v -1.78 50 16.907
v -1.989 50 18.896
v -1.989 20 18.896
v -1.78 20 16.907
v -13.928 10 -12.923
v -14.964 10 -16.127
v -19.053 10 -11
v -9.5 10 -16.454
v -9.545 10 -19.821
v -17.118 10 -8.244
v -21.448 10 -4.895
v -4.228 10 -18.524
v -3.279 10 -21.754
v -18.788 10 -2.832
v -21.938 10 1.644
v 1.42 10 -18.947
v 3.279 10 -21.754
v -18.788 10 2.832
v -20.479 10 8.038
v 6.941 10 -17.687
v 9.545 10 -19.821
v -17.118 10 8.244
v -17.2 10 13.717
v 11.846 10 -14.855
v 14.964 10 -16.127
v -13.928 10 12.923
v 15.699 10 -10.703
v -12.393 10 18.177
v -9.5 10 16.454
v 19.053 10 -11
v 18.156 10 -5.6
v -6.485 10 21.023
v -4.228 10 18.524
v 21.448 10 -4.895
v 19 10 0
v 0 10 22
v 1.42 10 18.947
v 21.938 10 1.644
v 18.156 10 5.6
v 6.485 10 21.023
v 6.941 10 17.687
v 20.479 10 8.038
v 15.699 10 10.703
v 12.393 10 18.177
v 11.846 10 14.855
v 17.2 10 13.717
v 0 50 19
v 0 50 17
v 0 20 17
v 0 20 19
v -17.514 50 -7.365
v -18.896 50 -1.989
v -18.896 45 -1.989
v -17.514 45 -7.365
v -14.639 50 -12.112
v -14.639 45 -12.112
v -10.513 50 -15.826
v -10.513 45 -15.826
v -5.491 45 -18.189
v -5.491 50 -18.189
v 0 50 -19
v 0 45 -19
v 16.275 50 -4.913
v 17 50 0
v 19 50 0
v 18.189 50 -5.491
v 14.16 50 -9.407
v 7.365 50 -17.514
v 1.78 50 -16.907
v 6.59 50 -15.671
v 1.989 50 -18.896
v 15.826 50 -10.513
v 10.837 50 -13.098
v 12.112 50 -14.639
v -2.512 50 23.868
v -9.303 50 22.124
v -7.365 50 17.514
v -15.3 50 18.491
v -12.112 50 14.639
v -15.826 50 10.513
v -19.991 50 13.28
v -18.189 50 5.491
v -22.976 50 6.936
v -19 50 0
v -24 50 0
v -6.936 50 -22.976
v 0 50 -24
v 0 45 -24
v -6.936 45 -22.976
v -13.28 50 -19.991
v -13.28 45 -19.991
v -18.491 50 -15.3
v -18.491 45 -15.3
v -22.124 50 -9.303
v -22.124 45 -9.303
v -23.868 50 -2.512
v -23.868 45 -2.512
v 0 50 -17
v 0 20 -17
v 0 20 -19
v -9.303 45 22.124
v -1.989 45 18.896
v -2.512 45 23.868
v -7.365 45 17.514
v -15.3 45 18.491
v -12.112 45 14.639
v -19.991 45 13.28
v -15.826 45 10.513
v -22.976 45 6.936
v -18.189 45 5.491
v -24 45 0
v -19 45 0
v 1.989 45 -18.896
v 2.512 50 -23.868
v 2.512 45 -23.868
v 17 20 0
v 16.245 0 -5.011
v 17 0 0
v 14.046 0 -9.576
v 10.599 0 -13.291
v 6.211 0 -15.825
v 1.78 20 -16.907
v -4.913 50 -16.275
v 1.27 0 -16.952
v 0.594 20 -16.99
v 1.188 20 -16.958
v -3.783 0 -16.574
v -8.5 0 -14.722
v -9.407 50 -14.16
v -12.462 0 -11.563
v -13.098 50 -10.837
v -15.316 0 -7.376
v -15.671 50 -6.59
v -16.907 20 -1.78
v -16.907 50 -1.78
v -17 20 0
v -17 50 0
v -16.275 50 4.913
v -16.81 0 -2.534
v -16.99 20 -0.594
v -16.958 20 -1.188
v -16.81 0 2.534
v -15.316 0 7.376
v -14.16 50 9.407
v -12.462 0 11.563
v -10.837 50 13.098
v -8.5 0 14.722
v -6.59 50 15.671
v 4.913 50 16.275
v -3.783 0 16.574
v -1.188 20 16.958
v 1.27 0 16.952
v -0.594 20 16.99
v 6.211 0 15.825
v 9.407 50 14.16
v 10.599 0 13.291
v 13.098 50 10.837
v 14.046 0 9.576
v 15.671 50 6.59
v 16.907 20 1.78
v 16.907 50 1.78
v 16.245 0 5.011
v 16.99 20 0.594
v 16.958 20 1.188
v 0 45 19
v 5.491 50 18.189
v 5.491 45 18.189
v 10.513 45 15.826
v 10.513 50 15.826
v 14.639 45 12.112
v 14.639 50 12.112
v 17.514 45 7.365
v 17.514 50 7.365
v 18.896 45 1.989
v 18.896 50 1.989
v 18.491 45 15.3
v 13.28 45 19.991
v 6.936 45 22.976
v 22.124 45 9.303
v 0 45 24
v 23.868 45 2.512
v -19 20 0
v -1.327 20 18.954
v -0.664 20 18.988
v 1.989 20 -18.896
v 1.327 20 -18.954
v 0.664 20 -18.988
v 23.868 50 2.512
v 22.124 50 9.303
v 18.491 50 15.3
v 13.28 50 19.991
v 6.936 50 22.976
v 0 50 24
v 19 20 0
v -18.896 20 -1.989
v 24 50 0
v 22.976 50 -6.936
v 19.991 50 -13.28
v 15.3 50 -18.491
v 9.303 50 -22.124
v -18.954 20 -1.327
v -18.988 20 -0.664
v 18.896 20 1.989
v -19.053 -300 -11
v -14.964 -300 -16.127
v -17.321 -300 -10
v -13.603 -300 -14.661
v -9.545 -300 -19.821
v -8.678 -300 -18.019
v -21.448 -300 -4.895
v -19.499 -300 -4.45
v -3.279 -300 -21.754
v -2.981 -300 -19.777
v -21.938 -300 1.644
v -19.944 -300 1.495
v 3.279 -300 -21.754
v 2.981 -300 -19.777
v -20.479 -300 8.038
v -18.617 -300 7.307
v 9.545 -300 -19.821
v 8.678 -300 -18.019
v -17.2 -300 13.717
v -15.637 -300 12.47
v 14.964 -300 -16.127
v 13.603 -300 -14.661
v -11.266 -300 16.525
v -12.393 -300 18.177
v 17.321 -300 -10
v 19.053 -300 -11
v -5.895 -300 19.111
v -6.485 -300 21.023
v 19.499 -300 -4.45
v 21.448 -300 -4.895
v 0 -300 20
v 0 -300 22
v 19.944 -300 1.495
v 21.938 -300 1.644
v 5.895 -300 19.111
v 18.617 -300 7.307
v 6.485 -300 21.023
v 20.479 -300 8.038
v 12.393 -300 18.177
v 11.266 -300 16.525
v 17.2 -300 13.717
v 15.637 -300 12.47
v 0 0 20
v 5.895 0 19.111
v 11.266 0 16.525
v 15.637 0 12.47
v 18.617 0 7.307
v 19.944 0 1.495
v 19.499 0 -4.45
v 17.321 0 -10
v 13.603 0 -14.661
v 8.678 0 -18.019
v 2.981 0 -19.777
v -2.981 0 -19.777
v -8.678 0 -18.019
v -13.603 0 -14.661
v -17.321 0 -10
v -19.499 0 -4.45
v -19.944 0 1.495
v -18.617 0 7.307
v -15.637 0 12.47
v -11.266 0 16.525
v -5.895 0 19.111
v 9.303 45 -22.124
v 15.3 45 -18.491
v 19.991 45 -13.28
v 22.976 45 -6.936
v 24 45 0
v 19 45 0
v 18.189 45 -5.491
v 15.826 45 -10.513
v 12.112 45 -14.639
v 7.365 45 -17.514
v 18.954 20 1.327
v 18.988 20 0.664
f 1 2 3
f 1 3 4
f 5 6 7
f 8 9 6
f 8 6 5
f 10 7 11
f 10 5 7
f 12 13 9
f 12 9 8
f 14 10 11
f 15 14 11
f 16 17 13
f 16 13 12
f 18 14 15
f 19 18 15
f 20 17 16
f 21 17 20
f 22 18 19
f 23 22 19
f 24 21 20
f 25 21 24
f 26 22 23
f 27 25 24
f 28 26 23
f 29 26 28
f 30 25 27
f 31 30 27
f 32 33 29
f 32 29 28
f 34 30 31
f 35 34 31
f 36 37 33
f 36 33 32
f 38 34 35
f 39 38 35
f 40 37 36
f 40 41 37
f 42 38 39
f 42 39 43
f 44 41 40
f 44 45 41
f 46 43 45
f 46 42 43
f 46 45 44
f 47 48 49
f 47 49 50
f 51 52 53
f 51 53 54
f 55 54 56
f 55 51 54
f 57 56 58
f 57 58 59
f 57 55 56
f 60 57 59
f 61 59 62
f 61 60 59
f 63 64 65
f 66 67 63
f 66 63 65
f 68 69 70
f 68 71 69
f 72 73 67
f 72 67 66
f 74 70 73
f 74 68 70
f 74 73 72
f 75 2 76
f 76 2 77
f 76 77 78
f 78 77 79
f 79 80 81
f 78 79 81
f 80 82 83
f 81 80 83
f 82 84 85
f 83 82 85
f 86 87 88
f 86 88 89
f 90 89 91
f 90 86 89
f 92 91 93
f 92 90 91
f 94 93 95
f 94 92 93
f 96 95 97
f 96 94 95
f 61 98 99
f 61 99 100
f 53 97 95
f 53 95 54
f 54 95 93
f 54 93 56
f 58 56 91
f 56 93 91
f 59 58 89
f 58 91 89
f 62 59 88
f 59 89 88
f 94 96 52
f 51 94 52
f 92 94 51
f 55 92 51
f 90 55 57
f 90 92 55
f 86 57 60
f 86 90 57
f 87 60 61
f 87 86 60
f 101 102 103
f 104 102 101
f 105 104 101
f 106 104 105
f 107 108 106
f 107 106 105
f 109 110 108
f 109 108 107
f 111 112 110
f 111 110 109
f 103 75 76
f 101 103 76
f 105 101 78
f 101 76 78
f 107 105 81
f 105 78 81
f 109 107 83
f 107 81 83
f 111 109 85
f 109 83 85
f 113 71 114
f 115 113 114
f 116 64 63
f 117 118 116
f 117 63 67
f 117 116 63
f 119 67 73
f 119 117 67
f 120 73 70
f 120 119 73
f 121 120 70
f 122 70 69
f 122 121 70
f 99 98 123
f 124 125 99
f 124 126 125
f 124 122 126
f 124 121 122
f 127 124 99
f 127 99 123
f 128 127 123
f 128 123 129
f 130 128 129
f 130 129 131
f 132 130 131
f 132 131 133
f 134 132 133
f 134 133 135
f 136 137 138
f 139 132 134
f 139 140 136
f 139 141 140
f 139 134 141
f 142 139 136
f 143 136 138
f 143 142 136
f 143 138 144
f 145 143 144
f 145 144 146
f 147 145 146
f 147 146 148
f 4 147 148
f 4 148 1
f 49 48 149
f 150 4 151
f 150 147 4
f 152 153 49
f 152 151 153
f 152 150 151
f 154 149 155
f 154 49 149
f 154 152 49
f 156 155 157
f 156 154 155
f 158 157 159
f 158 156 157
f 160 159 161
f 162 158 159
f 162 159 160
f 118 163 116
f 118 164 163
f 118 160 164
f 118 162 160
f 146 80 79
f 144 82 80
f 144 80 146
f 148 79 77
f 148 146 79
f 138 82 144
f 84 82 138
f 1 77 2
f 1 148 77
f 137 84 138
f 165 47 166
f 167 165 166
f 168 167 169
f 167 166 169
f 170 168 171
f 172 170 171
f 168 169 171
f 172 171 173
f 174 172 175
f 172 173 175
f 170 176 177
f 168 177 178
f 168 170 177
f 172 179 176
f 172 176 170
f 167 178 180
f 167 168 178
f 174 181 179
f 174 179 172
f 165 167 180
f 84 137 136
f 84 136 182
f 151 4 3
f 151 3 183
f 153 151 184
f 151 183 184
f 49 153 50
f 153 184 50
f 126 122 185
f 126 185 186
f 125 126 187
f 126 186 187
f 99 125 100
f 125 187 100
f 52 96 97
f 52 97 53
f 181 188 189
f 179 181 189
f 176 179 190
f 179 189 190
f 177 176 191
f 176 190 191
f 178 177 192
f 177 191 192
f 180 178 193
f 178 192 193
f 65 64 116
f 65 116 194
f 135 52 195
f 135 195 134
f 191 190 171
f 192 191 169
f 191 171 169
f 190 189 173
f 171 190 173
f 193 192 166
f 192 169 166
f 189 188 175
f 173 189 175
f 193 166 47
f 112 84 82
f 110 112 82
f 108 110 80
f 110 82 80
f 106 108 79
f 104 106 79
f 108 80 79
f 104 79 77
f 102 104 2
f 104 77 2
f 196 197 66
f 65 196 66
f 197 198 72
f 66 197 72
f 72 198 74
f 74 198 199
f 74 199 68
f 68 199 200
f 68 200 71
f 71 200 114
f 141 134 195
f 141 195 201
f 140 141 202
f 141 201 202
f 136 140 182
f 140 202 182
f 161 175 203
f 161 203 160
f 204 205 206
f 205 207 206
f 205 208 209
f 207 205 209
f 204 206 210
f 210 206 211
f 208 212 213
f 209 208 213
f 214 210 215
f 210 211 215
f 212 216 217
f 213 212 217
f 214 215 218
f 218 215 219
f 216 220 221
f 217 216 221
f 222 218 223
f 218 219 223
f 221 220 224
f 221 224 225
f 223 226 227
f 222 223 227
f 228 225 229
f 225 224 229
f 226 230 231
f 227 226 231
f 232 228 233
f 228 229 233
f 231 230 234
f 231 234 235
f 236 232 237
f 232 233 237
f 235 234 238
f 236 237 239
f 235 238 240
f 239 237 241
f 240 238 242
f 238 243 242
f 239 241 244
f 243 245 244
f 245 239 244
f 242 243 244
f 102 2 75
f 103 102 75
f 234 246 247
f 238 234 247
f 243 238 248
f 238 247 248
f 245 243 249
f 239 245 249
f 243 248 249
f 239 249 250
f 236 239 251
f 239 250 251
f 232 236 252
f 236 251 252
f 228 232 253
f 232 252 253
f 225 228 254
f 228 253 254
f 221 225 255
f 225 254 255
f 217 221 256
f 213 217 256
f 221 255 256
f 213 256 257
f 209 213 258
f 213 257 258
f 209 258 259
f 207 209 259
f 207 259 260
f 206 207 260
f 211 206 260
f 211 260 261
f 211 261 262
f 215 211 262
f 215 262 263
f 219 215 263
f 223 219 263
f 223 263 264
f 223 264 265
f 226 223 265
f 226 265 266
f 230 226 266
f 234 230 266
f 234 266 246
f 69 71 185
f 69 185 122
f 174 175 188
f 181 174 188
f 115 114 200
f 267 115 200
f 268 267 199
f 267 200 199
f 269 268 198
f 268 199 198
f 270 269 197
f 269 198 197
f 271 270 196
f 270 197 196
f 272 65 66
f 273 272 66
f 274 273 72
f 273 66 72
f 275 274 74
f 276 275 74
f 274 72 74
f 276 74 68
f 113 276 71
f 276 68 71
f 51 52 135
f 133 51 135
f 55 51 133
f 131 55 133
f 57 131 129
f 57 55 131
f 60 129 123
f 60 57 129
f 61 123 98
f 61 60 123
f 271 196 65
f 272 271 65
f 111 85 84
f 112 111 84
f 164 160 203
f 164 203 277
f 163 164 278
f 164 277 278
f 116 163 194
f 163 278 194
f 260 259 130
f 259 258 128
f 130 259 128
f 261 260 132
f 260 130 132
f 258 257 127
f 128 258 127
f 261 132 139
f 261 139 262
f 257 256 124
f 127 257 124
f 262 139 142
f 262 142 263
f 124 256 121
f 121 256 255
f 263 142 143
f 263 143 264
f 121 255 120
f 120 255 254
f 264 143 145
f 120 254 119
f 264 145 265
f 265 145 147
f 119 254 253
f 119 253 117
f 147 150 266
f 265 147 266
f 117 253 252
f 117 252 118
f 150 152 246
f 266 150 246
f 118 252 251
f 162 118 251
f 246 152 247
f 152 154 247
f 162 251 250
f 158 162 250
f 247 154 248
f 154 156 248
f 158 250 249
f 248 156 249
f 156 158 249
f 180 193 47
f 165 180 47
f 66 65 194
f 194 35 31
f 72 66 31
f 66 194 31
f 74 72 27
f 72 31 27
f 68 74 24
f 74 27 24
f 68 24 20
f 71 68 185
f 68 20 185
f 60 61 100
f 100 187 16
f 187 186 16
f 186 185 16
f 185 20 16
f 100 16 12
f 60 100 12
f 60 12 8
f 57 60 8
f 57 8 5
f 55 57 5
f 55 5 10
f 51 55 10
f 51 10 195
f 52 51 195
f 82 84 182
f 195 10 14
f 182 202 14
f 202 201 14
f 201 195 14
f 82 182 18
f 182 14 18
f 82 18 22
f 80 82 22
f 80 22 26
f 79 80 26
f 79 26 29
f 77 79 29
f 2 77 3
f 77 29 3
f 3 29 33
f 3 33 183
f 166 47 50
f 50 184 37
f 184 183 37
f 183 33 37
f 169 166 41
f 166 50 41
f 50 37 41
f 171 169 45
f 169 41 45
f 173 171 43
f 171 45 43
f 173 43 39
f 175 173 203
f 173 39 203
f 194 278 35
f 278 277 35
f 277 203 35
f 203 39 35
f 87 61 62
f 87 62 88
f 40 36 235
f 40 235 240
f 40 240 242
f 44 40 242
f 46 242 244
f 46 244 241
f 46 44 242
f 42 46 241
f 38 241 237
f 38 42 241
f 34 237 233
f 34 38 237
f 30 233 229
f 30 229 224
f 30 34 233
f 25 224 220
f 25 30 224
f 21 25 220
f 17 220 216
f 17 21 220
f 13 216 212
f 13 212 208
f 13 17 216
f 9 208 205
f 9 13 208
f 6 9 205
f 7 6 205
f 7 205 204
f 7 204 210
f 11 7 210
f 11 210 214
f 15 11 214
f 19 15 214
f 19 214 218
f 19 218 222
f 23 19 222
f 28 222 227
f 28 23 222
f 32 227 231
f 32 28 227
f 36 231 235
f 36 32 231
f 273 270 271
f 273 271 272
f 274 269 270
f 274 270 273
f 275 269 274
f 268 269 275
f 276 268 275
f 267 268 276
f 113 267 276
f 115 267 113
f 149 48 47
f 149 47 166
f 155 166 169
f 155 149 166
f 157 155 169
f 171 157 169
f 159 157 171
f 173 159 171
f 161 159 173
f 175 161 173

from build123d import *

# Parameters (mm, degrees)
SKETCH_1_R               = 19
SKETCH_1_R_2             = 17
EXTRUDE_1_DEPTH          = 50
CUT_EXTRUDE_1_DEPTH      = 30
PATTERN_CIRCULAR_1_COUNT = 4
EXTRUDE_1_2_DEPTH        = 5
EXTRUDE_1_2_2_DEPTH      = 5
EXTRUDE_1_2_3_DEPTH      = 5
EXTRUDE_1_2_4_DEPTH      = 5
SKETCH_6_R               = 22
SKETCH_6_R_2             = 20
EXTRUDE_3_DEPTH          = 310
EXTRUDE_START            = -10
SKETCH_7_R               = 20
SKETCH_7_R_2             = 19
EXTRUDE_4_DEPTH          = 10


with BuildPart() as part:
    # 草图1 → Extrude 1 (new body)
    with BuildSketch(Plane(origin=(0, 0, 0), x_dir=(1, 0, 0), z_dir=(0, 1, 0))):
        Circle(SKETCH_1_R)
        Circle(SKETCH_1_R_2, mode=Mode.SUBTRACT)
    extrude(amount=EXTRUDE_1_DEPTH)

    # 草图3 → 切除-拉伸1 (cut)
    with BuildSketch(Plane(origin=(0, 50, 0), x_dir=(1, 0, 0), z_dir=(0, 1, 0))):
        Polygon((0, 0), (0, 19), (2, 19), align=None)
    cut_extrude_1 = extrude(amount=-CUT_EXTRUDE_1_DEPTH, mode=Mode.SUBTRACT)

    # 阵列(圆周)1: 切除-拉伸1 ×4 about axis
    pattern_circular_1_axis = Axis((0, 50, 0), (0, -1, 0))
    for i in range(1, PATTERN_CIRCULAR_1_COUNT):
        add(cut_extrude_1.rotate(pattern_circular_1_axis, i * 360 / PATTERN_CIRCULAR_1_COUNT), mode=Mode.SUBTRACT)



with BuildPart() as body_2:
    # 草图4 → Extrude 1 2 (new body)
    with BuildSketch(Plane(origin=(0, 50, 0), x_dir=(1, 0, 0), z_dir=(0, 1, 0))):
        with BuildLine():
            Line((0, 19), (0, 24))
            ThreePointArc((0, 24), (-16.057732781, 17.836737873), (-23.86813087, 2.512434828))
            Line((-23.86813087, 2.512434828), (-18.895603606, 1.989010906))
            ThreePointArc((-18.895603606, 1.989010906), (-12.712371785, 14.120750816), (0, 19))
        make_face()
    extrude(amount=-EXTRUDE_1_2_DEPTH)


with BuildPart() as body_3:
    # 草图4 → Extrude 1 2 2 (new body)
    with BuildSketch(Plane(origin=(0, 50, 0), x_dir=(1, 0, 0), z_dir=(0, 1, 0))):
        with BuildLine():
            Line((1.989010906, 18.895603606), (2.512434828, 23.86813087))
            ThreePointArc((2.512434828, 23.86813087), (17.836737873, 16.057732781), (24, 0))
            Line((24, 0), (19, 0))
            ThreePointArc((19, 0), (14.120750816, 12.712371785), (1.989010906, 18.895603606))
        make_face()
    extrude(amount=-EXTRUDE_1_2_2_DEPTH)


with BuildPart() as body_4:
    # 草图4 → Extrude 1 2 3 (new body)
    with BuildSketch(Plane(origin=(0, 50, 0), x_dir=(1, 0, 0), z_dir=(0, 1, 0))):
        with BuildLine():
            Line((18.895603606, -1.989010906), (23.86813087, -2.512434828))
            ThreePointArc((23.86813087, -2.512434828), (16.057732781, -17.836737873), (0, -24))
            Line((0, -24), (0, -19))
            ThreePointArc((0, -19), (12.712371785, -14.120750816), (18.895603606, -1.989010906))
        make_face()
    extrude(amount=-EXTRUDE_1_2_3_DEPTH)


with BuildPart() as body_5:
    # 草图4 → Extrude 1 2 4 (new body)
    with BuildSketch(Plane(origin=(0, 50, 0), x_dir=(1, 0, 0), z_dir=(0, 1, 0))):
        with BuildLine():
            Line((-1.989010906, -18.895603606), (-2.512434828, -23.86813087))
            ThreePointArc((-2.512434828, -23.86813087), (-17.836737873, -16.057732781), (-24, 0))
            Line((-24, 0), (-19, 0))
            ThreePointArc((-19, 0), (-14.120750816, -12.712371785), (-1.989010906, -18.895603606))
        make_face()
    extrude(amount=-EXTRUDE_1_2_4_DEPTH)


with BuildPart() as body_6:
    # 草图6 → 凸台-拉伸3 (new body)
    with BuildSketch(Plane(origin=(0, 10, 0), x_dir=(1, 0, 0), z_dir=(0, 1, 0))):
        with Locations(Location((0, 0, 0), (0, 0, 270))):
            Circle(SKETCH_6_R)
        with Locations(Location((0, 0, 0), (0, 0, 270))):
            Circle(SKETCH_6_R_2, mode=Mode.SUBTRACT)
    extrude(amount=-EXTRUDE_3_DEPTH)


with BuildPart() as part_1:
    add(part.part)

    add(body_6.part)  # 凸台-拉伸4 merges body 6
    # 草图7 → 凸台-拉伸4 (add)
    with BuildSketch(Plane(origin=(0, 10, 0), x_dir=(1, 0, 0), z_dir=(0, 1, 0)).offset(EXTRUDE_START)):
        with Locations(Location((0, 0, 0), (0, 0, 270))):
            Circle(SKETCH_7_R)
        with Locations(Location((0, 0, 0), (0, 0, 270))):
            Circle(SKETCH_7_R_2, mode=Mode.SUBTRACT)
    extrude(amount=EXTRUDE_4_DEPTH)


solid = Compound([body_2.part, body_3.part, body_4.part, body_5.part, part_1.part])
